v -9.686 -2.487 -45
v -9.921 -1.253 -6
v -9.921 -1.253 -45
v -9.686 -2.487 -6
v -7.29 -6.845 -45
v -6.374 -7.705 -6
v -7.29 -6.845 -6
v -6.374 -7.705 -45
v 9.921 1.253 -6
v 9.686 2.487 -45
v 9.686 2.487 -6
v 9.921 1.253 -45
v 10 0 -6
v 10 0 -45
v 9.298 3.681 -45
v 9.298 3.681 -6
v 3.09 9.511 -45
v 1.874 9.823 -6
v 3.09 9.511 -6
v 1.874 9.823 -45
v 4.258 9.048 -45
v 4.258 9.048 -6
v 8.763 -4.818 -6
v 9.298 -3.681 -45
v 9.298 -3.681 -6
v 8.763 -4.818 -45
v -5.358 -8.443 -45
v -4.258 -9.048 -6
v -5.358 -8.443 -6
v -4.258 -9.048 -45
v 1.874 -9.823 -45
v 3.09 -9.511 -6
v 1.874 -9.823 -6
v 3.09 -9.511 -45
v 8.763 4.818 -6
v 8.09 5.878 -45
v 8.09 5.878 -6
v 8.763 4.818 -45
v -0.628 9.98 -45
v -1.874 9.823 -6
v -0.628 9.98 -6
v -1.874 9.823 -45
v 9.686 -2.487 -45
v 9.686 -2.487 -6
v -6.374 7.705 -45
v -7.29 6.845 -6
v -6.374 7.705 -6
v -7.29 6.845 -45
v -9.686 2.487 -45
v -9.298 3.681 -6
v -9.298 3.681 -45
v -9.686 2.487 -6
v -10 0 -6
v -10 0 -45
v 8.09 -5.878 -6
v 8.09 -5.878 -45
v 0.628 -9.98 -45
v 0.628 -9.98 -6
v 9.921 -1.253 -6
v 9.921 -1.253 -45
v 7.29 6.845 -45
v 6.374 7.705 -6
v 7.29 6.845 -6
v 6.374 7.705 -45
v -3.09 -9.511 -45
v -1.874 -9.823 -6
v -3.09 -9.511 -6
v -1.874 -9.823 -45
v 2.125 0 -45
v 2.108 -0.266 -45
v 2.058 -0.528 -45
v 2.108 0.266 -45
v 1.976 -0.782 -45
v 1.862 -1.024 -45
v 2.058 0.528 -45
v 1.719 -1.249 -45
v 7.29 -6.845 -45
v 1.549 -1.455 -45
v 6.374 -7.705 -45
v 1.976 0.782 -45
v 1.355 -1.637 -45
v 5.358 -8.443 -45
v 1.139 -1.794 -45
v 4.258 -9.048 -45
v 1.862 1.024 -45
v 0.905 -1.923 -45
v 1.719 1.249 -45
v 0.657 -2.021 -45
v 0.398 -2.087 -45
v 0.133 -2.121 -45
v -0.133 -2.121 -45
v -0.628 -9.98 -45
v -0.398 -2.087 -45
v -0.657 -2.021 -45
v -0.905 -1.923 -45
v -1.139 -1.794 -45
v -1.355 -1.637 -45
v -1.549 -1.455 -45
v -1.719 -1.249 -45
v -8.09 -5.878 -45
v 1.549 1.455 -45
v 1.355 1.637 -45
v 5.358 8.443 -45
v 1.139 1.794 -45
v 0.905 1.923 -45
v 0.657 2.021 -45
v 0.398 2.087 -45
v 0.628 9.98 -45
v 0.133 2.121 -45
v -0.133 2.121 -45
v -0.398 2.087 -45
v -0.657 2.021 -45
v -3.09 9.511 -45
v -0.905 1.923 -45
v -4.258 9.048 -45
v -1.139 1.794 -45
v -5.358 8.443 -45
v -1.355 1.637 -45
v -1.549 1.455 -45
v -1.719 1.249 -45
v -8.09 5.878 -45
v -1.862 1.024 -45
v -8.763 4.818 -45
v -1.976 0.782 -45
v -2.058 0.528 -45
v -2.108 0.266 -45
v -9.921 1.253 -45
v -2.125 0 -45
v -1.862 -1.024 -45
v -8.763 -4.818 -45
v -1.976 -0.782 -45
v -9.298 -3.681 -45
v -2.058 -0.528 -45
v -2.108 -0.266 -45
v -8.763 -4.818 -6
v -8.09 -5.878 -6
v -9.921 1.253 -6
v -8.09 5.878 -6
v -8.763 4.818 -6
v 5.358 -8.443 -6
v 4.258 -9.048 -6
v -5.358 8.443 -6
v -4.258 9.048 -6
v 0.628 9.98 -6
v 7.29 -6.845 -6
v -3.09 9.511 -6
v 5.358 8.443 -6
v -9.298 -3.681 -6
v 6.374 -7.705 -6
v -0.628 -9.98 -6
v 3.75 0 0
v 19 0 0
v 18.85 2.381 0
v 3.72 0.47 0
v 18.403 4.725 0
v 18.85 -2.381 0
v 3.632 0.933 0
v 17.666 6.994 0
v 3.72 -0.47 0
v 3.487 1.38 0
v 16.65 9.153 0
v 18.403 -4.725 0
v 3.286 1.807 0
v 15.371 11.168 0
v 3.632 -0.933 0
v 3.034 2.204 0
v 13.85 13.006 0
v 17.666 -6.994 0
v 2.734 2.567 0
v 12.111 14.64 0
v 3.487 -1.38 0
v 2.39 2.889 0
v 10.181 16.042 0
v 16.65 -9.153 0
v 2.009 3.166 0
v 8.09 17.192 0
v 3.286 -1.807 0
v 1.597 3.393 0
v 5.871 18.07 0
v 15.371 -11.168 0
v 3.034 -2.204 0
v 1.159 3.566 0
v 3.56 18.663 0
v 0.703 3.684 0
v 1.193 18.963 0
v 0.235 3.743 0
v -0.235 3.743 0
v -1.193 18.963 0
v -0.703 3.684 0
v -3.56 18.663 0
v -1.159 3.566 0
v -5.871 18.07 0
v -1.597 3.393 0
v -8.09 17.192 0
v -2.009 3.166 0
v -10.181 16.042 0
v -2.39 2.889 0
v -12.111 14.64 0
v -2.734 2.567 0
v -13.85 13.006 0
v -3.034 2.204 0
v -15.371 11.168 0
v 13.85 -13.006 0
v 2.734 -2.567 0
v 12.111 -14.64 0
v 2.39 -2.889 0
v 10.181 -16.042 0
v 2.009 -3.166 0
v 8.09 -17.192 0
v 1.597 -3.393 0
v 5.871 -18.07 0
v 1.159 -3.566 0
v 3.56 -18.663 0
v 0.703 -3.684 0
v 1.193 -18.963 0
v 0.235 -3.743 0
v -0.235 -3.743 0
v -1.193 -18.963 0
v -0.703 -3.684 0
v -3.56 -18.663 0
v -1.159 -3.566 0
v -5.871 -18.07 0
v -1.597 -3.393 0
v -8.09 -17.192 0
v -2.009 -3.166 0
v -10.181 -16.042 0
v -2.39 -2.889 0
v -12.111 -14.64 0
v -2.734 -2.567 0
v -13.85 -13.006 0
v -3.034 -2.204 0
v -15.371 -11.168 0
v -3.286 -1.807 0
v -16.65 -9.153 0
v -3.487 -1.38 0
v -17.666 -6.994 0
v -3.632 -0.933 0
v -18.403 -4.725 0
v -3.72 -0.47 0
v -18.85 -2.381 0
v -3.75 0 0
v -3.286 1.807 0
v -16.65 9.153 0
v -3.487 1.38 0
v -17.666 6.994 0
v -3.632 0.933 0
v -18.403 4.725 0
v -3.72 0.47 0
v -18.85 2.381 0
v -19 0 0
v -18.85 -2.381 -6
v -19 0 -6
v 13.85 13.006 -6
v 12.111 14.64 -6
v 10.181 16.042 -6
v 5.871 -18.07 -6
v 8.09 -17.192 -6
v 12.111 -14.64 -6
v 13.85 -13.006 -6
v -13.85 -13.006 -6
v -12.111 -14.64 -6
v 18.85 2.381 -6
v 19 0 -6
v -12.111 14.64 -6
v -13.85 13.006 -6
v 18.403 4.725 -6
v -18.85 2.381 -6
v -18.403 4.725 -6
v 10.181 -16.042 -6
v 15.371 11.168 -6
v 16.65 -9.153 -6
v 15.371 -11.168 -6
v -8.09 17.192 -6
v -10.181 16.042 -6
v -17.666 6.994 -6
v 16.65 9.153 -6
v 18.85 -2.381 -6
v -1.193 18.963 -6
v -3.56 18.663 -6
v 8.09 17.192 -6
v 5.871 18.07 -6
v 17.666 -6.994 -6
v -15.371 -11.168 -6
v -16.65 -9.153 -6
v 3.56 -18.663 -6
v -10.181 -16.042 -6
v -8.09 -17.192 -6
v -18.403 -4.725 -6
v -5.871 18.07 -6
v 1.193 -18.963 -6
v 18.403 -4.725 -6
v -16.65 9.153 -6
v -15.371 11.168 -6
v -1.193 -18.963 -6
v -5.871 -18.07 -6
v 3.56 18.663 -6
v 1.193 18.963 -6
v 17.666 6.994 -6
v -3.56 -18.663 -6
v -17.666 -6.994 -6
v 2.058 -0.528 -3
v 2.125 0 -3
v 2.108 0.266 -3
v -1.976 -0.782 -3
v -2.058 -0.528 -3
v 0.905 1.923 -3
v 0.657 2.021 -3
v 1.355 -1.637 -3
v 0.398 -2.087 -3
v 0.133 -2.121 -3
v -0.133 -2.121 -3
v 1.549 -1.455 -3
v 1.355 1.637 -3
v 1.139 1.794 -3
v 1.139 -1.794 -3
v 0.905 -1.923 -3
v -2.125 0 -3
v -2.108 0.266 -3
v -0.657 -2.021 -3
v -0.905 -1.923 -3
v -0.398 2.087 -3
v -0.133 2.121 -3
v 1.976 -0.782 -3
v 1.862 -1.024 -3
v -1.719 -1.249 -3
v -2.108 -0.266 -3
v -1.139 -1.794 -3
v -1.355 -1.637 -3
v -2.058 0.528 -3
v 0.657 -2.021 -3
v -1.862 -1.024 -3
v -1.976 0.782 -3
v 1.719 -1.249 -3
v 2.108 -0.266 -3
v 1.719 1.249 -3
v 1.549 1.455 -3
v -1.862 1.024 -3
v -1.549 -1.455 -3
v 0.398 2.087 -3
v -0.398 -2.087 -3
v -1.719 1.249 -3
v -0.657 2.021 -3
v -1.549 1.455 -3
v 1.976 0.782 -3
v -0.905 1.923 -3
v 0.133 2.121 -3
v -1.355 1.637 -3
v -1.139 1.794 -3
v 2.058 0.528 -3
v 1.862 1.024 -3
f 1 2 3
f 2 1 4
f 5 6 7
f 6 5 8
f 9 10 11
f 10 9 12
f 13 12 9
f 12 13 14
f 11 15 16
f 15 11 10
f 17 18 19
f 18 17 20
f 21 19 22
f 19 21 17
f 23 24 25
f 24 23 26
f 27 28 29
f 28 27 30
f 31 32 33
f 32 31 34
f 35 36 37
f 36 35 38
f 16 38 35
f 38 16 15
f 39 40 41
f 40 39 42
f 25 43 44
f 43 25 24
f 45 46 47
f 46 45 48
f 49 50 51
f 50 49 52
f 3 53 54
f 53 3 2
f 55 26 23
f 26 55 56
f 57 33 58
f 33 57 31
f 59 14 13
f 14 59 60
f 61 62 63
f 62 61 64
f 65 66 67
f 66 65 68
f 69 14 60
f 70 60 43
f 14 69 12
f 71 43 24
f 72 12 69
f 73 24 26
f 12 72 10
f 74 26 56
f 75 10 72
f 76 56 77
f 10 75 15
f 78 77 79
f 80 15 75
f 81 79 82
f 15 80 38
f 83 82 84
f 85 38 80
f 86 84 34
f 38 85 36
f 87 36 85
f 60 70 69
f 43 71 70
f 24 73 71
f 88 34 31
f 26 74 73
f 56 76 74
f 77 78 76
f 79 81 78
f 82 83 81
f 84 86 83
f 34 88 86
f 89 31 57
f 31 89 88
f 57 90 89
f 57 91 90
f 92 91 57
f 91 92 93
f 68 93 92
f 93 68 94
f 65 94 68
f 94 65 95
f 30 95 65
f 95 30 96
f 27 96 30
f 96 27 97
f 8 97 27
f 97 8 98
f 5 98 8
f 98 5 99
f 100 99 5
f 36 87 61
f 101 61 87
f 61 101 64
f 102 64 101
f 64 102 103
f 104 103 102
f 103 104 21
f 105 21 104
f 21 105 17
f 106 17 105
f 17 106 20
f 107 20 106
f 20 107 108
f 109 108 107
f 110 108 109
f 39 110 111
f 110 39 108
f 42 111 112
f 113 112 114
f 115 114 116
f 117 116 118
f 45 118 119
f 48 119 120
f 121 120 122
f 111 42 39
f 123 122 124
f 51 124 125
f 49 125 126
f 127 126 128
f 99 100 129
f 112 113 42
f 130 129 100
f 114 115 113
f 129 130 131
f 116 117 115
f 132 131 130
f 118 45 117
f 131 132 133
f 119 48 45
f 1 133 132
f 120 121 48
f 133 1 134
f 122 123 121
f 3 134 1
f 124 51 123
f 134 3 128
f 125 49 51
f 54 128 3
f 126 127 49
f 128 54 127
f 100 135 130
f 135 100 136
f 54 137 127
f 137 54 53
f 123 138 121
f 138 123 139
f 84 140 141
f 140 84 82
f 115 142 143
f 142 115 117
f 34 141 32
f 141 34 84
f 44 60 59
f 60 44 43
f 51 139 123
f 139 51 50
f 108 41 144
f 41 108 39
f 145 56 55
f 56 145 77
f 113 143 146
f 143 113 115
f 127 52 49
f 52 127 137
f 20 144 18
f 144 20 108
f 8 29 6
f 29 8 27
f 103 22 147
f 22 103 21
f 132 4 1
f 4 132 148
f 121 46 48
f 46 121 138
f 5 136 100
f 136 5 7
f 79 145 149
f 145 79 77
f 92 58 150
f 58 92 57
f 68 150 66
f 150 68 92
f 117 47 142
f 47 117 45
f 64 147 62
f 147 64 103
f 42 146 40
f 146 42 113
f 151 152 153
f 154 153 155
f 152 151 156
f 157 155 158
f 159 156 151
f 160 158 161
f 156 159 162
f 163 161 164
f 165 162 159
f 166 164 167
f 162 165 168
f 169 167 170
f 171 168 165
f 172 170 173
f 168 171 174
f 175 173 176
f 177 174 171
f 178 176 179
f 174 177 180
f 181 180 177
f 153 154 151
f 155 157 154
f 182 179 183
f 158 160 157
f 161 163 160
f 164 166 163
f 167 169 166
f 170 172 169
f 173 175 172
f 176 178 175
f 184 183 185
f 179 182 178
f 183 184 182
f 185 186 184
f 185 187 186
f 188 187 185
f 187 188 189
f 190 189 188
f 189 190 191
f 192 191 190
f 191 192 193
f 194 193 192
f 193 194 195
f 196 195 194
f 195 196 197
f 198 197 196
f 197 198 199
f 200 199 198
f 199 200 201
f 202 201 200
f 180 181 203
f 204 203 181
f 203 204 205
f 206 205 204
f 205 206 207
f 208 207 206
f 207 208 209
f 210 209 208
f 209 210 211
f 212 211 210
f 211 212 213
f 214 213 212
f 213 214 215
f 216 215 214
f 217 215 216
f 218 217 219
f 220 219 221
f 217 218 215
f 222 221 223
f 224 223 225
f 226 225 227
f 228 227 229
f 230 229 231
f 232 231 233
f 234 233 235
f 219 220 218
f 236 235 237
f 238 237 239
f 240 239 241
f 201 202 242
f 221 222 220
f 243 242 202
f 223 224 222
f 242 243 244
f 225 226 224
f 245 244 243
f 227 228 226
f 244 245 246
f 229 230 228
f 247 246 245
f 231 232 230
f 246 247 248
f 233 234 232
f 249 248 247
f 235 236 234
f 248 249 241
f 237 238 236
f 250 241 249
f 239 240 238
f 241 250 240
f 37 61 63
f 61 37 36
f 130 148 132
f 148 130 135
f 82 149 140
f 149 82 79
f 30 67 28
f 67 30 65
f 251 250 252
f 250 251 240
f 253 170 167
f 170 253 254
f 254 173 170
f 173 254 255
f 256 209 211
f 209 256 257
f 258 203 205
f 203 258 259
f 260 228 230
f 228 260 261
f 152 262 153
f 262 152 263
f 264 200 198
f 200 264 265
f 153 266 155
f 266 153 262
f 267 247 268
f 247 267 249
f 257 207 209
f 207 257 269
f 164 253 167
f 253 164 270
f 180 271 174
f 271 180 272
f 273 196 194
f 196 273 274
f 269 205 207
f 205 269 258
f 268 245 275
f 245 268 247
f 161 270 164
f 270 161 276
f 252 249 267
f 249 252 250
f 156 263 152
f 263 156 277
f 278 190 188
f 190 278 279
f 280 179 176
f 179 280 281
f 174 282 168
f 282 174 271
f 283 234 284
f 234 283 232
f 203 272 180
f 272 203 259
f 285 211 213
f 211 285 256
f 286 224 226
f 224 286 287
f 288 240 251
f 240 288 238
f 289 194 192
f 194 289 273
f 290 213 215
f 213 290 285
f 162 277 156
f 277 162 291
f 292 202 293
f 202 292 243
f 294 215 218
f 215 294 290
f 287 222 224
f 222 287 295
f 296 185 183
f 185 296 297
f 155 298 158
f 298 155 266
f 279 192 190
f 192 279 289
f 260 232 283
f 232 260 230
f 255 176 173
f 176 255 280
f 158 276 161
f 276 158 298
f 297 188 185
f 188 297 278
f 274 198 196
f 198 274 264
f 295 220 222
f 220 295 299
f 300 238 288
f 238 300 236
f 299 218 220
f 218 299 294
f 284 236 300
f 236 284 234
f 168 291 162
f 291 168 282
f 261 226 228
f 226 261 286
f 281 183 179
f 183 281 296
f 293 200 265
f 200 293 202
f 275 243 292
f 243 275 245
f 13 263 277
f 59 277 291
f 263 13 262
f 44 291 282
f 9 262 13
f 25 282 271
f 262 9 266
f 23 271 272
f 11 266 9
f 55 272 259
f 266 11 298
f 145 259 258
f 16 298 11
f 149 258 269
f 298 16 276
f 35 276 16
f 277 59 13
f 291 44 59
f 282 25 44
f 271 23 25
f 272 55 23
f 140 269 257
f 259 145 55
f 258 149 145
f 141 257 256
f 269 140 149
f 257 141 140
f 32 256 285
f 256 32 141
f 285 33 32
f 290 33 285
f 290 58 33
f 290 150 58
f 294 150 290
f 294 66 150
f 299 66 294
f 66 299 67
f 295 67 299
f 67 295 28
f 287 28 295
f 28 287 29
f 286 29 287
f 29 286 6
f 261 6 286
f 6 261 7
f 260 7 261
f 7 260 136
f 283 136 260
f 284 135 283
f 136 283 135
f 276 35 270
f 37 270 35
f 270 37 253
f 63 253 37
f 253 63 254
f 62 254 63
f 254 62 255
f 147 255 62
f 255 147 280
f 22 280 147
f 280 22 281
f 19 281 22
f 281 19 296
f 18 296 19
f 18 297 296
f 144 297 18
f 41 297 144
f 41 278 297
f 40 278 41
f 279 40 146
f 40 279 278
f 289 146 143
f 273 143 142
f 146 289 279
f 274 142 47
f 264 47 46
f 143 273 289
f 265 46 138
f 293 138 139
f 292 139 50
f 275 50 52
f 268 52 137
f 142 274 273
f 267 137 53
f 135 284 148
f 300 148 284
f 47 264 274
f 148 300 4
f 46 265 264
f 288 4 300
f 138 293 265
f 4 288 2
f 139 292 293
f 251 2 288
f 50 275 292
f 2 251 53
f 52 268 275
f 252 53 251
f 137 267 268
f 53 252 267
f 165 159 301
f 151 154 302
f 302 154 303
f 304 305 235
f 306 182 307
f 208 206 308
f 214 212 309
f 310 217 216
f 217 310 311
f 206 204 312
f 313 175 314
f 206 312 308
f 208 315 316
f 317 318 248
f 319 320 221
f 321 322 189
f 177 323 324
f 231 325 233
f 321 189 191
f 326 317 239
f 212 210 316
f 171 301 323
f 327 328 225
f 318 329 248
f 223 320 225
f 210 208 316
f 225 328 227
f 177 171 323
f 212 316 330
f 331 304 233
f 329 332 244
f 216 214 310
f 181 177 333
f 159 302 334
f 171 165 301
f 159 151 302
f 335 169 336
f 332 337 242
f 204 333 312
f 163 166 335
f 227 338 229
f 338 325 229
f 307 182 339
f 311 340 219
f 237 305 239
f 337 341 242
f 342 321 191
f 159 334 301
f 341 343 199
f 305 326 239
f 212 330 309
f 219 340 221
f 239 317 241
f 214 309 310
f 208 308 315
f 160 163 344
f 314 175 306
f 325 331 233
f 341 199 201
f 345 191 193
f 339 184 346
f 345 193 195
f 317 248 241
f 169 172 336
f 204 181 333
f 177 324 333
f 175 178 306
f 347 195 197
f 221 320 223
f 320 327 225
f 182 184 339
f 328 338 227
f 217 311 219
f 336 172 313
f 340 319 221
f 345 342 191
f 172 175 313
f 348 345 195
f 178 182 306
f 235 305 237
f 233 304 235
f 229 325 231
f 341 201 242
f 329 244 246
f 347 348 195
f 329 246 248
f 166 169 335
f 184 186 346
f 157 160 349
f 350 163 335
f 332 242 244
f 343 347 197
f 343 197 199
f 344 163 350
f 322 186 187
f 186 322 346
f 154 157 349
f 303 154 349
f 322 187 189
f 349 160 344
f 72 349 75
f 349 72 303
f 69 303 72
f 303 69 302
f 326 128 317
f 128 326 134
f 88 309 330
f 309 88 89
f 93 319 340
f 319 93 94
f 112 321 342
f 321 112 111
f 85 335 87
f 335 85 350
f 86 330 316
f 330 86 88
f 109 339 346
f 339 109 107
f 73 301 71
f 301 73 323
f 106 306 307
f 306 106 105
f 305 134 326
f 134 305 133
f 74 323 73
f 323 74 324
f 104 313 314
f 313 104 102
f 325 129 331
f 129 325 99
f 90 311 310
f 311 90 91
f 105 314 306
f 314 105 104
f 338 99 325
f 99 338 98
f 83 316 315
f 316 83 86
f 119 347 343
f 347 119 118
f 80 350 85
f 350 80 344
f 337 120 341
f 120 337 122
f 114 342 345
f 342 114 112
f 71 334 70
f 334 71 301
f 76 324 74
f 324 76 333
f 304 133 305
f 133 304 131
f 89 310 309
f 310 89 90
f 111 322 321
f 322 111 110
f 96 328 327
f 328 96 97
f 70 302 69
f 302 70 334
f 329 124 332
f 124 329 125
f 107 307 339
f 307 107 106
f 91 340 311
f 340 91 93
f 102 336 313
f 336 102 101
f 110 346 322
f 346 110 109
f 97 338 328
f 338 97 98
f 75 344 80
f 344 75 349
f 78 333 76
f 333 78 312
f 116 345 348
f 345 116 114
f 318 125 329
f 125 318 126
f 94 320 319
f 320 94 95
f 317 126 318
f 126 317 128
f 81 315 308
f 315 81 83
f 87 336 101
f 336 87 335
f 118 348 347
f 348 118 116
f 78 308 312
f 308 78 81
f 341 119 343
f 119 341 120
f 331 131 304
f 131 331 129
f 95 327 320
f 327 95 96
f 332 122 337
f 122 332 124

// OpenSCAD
$fn = 50;


difference() {
	union() {
		translate(v = [0, 0, -45.0000000000]) {
			cylinder(h = 45, r = 10.0000000000);
		}
		translate(v = [0, 0, -6.0000000000]) {
			cylinder(h = 6, r = 19.0000000000);
		}
	}
	union() {
		translate(v = [0, 0, 0]) {
			rotate(a = [0, 0, 0]) {
				difference() {
					union() {
						#translate(v = [0, 0, -45.0000000000]) {
							cylinder(h = 45, r = 2.0000000000);
						}
						#translate(v = [0, 0, -3]) {
							cylinder(h = 3, r = 10.0000000000, r1 = 2.1250000000, r2 = 3.7500000000);
						}
						#translate(v = [0, 0, -45.0000000000]) {
							cylinder(h = 45, r = 2.1250000000);
						}
						#translate(v = [0, 0, -45.0000000000]) {
							cylinder(h = 45, r = 2.0000000000);
						}
					}
					union();
				}
			}
		}
	}
}
